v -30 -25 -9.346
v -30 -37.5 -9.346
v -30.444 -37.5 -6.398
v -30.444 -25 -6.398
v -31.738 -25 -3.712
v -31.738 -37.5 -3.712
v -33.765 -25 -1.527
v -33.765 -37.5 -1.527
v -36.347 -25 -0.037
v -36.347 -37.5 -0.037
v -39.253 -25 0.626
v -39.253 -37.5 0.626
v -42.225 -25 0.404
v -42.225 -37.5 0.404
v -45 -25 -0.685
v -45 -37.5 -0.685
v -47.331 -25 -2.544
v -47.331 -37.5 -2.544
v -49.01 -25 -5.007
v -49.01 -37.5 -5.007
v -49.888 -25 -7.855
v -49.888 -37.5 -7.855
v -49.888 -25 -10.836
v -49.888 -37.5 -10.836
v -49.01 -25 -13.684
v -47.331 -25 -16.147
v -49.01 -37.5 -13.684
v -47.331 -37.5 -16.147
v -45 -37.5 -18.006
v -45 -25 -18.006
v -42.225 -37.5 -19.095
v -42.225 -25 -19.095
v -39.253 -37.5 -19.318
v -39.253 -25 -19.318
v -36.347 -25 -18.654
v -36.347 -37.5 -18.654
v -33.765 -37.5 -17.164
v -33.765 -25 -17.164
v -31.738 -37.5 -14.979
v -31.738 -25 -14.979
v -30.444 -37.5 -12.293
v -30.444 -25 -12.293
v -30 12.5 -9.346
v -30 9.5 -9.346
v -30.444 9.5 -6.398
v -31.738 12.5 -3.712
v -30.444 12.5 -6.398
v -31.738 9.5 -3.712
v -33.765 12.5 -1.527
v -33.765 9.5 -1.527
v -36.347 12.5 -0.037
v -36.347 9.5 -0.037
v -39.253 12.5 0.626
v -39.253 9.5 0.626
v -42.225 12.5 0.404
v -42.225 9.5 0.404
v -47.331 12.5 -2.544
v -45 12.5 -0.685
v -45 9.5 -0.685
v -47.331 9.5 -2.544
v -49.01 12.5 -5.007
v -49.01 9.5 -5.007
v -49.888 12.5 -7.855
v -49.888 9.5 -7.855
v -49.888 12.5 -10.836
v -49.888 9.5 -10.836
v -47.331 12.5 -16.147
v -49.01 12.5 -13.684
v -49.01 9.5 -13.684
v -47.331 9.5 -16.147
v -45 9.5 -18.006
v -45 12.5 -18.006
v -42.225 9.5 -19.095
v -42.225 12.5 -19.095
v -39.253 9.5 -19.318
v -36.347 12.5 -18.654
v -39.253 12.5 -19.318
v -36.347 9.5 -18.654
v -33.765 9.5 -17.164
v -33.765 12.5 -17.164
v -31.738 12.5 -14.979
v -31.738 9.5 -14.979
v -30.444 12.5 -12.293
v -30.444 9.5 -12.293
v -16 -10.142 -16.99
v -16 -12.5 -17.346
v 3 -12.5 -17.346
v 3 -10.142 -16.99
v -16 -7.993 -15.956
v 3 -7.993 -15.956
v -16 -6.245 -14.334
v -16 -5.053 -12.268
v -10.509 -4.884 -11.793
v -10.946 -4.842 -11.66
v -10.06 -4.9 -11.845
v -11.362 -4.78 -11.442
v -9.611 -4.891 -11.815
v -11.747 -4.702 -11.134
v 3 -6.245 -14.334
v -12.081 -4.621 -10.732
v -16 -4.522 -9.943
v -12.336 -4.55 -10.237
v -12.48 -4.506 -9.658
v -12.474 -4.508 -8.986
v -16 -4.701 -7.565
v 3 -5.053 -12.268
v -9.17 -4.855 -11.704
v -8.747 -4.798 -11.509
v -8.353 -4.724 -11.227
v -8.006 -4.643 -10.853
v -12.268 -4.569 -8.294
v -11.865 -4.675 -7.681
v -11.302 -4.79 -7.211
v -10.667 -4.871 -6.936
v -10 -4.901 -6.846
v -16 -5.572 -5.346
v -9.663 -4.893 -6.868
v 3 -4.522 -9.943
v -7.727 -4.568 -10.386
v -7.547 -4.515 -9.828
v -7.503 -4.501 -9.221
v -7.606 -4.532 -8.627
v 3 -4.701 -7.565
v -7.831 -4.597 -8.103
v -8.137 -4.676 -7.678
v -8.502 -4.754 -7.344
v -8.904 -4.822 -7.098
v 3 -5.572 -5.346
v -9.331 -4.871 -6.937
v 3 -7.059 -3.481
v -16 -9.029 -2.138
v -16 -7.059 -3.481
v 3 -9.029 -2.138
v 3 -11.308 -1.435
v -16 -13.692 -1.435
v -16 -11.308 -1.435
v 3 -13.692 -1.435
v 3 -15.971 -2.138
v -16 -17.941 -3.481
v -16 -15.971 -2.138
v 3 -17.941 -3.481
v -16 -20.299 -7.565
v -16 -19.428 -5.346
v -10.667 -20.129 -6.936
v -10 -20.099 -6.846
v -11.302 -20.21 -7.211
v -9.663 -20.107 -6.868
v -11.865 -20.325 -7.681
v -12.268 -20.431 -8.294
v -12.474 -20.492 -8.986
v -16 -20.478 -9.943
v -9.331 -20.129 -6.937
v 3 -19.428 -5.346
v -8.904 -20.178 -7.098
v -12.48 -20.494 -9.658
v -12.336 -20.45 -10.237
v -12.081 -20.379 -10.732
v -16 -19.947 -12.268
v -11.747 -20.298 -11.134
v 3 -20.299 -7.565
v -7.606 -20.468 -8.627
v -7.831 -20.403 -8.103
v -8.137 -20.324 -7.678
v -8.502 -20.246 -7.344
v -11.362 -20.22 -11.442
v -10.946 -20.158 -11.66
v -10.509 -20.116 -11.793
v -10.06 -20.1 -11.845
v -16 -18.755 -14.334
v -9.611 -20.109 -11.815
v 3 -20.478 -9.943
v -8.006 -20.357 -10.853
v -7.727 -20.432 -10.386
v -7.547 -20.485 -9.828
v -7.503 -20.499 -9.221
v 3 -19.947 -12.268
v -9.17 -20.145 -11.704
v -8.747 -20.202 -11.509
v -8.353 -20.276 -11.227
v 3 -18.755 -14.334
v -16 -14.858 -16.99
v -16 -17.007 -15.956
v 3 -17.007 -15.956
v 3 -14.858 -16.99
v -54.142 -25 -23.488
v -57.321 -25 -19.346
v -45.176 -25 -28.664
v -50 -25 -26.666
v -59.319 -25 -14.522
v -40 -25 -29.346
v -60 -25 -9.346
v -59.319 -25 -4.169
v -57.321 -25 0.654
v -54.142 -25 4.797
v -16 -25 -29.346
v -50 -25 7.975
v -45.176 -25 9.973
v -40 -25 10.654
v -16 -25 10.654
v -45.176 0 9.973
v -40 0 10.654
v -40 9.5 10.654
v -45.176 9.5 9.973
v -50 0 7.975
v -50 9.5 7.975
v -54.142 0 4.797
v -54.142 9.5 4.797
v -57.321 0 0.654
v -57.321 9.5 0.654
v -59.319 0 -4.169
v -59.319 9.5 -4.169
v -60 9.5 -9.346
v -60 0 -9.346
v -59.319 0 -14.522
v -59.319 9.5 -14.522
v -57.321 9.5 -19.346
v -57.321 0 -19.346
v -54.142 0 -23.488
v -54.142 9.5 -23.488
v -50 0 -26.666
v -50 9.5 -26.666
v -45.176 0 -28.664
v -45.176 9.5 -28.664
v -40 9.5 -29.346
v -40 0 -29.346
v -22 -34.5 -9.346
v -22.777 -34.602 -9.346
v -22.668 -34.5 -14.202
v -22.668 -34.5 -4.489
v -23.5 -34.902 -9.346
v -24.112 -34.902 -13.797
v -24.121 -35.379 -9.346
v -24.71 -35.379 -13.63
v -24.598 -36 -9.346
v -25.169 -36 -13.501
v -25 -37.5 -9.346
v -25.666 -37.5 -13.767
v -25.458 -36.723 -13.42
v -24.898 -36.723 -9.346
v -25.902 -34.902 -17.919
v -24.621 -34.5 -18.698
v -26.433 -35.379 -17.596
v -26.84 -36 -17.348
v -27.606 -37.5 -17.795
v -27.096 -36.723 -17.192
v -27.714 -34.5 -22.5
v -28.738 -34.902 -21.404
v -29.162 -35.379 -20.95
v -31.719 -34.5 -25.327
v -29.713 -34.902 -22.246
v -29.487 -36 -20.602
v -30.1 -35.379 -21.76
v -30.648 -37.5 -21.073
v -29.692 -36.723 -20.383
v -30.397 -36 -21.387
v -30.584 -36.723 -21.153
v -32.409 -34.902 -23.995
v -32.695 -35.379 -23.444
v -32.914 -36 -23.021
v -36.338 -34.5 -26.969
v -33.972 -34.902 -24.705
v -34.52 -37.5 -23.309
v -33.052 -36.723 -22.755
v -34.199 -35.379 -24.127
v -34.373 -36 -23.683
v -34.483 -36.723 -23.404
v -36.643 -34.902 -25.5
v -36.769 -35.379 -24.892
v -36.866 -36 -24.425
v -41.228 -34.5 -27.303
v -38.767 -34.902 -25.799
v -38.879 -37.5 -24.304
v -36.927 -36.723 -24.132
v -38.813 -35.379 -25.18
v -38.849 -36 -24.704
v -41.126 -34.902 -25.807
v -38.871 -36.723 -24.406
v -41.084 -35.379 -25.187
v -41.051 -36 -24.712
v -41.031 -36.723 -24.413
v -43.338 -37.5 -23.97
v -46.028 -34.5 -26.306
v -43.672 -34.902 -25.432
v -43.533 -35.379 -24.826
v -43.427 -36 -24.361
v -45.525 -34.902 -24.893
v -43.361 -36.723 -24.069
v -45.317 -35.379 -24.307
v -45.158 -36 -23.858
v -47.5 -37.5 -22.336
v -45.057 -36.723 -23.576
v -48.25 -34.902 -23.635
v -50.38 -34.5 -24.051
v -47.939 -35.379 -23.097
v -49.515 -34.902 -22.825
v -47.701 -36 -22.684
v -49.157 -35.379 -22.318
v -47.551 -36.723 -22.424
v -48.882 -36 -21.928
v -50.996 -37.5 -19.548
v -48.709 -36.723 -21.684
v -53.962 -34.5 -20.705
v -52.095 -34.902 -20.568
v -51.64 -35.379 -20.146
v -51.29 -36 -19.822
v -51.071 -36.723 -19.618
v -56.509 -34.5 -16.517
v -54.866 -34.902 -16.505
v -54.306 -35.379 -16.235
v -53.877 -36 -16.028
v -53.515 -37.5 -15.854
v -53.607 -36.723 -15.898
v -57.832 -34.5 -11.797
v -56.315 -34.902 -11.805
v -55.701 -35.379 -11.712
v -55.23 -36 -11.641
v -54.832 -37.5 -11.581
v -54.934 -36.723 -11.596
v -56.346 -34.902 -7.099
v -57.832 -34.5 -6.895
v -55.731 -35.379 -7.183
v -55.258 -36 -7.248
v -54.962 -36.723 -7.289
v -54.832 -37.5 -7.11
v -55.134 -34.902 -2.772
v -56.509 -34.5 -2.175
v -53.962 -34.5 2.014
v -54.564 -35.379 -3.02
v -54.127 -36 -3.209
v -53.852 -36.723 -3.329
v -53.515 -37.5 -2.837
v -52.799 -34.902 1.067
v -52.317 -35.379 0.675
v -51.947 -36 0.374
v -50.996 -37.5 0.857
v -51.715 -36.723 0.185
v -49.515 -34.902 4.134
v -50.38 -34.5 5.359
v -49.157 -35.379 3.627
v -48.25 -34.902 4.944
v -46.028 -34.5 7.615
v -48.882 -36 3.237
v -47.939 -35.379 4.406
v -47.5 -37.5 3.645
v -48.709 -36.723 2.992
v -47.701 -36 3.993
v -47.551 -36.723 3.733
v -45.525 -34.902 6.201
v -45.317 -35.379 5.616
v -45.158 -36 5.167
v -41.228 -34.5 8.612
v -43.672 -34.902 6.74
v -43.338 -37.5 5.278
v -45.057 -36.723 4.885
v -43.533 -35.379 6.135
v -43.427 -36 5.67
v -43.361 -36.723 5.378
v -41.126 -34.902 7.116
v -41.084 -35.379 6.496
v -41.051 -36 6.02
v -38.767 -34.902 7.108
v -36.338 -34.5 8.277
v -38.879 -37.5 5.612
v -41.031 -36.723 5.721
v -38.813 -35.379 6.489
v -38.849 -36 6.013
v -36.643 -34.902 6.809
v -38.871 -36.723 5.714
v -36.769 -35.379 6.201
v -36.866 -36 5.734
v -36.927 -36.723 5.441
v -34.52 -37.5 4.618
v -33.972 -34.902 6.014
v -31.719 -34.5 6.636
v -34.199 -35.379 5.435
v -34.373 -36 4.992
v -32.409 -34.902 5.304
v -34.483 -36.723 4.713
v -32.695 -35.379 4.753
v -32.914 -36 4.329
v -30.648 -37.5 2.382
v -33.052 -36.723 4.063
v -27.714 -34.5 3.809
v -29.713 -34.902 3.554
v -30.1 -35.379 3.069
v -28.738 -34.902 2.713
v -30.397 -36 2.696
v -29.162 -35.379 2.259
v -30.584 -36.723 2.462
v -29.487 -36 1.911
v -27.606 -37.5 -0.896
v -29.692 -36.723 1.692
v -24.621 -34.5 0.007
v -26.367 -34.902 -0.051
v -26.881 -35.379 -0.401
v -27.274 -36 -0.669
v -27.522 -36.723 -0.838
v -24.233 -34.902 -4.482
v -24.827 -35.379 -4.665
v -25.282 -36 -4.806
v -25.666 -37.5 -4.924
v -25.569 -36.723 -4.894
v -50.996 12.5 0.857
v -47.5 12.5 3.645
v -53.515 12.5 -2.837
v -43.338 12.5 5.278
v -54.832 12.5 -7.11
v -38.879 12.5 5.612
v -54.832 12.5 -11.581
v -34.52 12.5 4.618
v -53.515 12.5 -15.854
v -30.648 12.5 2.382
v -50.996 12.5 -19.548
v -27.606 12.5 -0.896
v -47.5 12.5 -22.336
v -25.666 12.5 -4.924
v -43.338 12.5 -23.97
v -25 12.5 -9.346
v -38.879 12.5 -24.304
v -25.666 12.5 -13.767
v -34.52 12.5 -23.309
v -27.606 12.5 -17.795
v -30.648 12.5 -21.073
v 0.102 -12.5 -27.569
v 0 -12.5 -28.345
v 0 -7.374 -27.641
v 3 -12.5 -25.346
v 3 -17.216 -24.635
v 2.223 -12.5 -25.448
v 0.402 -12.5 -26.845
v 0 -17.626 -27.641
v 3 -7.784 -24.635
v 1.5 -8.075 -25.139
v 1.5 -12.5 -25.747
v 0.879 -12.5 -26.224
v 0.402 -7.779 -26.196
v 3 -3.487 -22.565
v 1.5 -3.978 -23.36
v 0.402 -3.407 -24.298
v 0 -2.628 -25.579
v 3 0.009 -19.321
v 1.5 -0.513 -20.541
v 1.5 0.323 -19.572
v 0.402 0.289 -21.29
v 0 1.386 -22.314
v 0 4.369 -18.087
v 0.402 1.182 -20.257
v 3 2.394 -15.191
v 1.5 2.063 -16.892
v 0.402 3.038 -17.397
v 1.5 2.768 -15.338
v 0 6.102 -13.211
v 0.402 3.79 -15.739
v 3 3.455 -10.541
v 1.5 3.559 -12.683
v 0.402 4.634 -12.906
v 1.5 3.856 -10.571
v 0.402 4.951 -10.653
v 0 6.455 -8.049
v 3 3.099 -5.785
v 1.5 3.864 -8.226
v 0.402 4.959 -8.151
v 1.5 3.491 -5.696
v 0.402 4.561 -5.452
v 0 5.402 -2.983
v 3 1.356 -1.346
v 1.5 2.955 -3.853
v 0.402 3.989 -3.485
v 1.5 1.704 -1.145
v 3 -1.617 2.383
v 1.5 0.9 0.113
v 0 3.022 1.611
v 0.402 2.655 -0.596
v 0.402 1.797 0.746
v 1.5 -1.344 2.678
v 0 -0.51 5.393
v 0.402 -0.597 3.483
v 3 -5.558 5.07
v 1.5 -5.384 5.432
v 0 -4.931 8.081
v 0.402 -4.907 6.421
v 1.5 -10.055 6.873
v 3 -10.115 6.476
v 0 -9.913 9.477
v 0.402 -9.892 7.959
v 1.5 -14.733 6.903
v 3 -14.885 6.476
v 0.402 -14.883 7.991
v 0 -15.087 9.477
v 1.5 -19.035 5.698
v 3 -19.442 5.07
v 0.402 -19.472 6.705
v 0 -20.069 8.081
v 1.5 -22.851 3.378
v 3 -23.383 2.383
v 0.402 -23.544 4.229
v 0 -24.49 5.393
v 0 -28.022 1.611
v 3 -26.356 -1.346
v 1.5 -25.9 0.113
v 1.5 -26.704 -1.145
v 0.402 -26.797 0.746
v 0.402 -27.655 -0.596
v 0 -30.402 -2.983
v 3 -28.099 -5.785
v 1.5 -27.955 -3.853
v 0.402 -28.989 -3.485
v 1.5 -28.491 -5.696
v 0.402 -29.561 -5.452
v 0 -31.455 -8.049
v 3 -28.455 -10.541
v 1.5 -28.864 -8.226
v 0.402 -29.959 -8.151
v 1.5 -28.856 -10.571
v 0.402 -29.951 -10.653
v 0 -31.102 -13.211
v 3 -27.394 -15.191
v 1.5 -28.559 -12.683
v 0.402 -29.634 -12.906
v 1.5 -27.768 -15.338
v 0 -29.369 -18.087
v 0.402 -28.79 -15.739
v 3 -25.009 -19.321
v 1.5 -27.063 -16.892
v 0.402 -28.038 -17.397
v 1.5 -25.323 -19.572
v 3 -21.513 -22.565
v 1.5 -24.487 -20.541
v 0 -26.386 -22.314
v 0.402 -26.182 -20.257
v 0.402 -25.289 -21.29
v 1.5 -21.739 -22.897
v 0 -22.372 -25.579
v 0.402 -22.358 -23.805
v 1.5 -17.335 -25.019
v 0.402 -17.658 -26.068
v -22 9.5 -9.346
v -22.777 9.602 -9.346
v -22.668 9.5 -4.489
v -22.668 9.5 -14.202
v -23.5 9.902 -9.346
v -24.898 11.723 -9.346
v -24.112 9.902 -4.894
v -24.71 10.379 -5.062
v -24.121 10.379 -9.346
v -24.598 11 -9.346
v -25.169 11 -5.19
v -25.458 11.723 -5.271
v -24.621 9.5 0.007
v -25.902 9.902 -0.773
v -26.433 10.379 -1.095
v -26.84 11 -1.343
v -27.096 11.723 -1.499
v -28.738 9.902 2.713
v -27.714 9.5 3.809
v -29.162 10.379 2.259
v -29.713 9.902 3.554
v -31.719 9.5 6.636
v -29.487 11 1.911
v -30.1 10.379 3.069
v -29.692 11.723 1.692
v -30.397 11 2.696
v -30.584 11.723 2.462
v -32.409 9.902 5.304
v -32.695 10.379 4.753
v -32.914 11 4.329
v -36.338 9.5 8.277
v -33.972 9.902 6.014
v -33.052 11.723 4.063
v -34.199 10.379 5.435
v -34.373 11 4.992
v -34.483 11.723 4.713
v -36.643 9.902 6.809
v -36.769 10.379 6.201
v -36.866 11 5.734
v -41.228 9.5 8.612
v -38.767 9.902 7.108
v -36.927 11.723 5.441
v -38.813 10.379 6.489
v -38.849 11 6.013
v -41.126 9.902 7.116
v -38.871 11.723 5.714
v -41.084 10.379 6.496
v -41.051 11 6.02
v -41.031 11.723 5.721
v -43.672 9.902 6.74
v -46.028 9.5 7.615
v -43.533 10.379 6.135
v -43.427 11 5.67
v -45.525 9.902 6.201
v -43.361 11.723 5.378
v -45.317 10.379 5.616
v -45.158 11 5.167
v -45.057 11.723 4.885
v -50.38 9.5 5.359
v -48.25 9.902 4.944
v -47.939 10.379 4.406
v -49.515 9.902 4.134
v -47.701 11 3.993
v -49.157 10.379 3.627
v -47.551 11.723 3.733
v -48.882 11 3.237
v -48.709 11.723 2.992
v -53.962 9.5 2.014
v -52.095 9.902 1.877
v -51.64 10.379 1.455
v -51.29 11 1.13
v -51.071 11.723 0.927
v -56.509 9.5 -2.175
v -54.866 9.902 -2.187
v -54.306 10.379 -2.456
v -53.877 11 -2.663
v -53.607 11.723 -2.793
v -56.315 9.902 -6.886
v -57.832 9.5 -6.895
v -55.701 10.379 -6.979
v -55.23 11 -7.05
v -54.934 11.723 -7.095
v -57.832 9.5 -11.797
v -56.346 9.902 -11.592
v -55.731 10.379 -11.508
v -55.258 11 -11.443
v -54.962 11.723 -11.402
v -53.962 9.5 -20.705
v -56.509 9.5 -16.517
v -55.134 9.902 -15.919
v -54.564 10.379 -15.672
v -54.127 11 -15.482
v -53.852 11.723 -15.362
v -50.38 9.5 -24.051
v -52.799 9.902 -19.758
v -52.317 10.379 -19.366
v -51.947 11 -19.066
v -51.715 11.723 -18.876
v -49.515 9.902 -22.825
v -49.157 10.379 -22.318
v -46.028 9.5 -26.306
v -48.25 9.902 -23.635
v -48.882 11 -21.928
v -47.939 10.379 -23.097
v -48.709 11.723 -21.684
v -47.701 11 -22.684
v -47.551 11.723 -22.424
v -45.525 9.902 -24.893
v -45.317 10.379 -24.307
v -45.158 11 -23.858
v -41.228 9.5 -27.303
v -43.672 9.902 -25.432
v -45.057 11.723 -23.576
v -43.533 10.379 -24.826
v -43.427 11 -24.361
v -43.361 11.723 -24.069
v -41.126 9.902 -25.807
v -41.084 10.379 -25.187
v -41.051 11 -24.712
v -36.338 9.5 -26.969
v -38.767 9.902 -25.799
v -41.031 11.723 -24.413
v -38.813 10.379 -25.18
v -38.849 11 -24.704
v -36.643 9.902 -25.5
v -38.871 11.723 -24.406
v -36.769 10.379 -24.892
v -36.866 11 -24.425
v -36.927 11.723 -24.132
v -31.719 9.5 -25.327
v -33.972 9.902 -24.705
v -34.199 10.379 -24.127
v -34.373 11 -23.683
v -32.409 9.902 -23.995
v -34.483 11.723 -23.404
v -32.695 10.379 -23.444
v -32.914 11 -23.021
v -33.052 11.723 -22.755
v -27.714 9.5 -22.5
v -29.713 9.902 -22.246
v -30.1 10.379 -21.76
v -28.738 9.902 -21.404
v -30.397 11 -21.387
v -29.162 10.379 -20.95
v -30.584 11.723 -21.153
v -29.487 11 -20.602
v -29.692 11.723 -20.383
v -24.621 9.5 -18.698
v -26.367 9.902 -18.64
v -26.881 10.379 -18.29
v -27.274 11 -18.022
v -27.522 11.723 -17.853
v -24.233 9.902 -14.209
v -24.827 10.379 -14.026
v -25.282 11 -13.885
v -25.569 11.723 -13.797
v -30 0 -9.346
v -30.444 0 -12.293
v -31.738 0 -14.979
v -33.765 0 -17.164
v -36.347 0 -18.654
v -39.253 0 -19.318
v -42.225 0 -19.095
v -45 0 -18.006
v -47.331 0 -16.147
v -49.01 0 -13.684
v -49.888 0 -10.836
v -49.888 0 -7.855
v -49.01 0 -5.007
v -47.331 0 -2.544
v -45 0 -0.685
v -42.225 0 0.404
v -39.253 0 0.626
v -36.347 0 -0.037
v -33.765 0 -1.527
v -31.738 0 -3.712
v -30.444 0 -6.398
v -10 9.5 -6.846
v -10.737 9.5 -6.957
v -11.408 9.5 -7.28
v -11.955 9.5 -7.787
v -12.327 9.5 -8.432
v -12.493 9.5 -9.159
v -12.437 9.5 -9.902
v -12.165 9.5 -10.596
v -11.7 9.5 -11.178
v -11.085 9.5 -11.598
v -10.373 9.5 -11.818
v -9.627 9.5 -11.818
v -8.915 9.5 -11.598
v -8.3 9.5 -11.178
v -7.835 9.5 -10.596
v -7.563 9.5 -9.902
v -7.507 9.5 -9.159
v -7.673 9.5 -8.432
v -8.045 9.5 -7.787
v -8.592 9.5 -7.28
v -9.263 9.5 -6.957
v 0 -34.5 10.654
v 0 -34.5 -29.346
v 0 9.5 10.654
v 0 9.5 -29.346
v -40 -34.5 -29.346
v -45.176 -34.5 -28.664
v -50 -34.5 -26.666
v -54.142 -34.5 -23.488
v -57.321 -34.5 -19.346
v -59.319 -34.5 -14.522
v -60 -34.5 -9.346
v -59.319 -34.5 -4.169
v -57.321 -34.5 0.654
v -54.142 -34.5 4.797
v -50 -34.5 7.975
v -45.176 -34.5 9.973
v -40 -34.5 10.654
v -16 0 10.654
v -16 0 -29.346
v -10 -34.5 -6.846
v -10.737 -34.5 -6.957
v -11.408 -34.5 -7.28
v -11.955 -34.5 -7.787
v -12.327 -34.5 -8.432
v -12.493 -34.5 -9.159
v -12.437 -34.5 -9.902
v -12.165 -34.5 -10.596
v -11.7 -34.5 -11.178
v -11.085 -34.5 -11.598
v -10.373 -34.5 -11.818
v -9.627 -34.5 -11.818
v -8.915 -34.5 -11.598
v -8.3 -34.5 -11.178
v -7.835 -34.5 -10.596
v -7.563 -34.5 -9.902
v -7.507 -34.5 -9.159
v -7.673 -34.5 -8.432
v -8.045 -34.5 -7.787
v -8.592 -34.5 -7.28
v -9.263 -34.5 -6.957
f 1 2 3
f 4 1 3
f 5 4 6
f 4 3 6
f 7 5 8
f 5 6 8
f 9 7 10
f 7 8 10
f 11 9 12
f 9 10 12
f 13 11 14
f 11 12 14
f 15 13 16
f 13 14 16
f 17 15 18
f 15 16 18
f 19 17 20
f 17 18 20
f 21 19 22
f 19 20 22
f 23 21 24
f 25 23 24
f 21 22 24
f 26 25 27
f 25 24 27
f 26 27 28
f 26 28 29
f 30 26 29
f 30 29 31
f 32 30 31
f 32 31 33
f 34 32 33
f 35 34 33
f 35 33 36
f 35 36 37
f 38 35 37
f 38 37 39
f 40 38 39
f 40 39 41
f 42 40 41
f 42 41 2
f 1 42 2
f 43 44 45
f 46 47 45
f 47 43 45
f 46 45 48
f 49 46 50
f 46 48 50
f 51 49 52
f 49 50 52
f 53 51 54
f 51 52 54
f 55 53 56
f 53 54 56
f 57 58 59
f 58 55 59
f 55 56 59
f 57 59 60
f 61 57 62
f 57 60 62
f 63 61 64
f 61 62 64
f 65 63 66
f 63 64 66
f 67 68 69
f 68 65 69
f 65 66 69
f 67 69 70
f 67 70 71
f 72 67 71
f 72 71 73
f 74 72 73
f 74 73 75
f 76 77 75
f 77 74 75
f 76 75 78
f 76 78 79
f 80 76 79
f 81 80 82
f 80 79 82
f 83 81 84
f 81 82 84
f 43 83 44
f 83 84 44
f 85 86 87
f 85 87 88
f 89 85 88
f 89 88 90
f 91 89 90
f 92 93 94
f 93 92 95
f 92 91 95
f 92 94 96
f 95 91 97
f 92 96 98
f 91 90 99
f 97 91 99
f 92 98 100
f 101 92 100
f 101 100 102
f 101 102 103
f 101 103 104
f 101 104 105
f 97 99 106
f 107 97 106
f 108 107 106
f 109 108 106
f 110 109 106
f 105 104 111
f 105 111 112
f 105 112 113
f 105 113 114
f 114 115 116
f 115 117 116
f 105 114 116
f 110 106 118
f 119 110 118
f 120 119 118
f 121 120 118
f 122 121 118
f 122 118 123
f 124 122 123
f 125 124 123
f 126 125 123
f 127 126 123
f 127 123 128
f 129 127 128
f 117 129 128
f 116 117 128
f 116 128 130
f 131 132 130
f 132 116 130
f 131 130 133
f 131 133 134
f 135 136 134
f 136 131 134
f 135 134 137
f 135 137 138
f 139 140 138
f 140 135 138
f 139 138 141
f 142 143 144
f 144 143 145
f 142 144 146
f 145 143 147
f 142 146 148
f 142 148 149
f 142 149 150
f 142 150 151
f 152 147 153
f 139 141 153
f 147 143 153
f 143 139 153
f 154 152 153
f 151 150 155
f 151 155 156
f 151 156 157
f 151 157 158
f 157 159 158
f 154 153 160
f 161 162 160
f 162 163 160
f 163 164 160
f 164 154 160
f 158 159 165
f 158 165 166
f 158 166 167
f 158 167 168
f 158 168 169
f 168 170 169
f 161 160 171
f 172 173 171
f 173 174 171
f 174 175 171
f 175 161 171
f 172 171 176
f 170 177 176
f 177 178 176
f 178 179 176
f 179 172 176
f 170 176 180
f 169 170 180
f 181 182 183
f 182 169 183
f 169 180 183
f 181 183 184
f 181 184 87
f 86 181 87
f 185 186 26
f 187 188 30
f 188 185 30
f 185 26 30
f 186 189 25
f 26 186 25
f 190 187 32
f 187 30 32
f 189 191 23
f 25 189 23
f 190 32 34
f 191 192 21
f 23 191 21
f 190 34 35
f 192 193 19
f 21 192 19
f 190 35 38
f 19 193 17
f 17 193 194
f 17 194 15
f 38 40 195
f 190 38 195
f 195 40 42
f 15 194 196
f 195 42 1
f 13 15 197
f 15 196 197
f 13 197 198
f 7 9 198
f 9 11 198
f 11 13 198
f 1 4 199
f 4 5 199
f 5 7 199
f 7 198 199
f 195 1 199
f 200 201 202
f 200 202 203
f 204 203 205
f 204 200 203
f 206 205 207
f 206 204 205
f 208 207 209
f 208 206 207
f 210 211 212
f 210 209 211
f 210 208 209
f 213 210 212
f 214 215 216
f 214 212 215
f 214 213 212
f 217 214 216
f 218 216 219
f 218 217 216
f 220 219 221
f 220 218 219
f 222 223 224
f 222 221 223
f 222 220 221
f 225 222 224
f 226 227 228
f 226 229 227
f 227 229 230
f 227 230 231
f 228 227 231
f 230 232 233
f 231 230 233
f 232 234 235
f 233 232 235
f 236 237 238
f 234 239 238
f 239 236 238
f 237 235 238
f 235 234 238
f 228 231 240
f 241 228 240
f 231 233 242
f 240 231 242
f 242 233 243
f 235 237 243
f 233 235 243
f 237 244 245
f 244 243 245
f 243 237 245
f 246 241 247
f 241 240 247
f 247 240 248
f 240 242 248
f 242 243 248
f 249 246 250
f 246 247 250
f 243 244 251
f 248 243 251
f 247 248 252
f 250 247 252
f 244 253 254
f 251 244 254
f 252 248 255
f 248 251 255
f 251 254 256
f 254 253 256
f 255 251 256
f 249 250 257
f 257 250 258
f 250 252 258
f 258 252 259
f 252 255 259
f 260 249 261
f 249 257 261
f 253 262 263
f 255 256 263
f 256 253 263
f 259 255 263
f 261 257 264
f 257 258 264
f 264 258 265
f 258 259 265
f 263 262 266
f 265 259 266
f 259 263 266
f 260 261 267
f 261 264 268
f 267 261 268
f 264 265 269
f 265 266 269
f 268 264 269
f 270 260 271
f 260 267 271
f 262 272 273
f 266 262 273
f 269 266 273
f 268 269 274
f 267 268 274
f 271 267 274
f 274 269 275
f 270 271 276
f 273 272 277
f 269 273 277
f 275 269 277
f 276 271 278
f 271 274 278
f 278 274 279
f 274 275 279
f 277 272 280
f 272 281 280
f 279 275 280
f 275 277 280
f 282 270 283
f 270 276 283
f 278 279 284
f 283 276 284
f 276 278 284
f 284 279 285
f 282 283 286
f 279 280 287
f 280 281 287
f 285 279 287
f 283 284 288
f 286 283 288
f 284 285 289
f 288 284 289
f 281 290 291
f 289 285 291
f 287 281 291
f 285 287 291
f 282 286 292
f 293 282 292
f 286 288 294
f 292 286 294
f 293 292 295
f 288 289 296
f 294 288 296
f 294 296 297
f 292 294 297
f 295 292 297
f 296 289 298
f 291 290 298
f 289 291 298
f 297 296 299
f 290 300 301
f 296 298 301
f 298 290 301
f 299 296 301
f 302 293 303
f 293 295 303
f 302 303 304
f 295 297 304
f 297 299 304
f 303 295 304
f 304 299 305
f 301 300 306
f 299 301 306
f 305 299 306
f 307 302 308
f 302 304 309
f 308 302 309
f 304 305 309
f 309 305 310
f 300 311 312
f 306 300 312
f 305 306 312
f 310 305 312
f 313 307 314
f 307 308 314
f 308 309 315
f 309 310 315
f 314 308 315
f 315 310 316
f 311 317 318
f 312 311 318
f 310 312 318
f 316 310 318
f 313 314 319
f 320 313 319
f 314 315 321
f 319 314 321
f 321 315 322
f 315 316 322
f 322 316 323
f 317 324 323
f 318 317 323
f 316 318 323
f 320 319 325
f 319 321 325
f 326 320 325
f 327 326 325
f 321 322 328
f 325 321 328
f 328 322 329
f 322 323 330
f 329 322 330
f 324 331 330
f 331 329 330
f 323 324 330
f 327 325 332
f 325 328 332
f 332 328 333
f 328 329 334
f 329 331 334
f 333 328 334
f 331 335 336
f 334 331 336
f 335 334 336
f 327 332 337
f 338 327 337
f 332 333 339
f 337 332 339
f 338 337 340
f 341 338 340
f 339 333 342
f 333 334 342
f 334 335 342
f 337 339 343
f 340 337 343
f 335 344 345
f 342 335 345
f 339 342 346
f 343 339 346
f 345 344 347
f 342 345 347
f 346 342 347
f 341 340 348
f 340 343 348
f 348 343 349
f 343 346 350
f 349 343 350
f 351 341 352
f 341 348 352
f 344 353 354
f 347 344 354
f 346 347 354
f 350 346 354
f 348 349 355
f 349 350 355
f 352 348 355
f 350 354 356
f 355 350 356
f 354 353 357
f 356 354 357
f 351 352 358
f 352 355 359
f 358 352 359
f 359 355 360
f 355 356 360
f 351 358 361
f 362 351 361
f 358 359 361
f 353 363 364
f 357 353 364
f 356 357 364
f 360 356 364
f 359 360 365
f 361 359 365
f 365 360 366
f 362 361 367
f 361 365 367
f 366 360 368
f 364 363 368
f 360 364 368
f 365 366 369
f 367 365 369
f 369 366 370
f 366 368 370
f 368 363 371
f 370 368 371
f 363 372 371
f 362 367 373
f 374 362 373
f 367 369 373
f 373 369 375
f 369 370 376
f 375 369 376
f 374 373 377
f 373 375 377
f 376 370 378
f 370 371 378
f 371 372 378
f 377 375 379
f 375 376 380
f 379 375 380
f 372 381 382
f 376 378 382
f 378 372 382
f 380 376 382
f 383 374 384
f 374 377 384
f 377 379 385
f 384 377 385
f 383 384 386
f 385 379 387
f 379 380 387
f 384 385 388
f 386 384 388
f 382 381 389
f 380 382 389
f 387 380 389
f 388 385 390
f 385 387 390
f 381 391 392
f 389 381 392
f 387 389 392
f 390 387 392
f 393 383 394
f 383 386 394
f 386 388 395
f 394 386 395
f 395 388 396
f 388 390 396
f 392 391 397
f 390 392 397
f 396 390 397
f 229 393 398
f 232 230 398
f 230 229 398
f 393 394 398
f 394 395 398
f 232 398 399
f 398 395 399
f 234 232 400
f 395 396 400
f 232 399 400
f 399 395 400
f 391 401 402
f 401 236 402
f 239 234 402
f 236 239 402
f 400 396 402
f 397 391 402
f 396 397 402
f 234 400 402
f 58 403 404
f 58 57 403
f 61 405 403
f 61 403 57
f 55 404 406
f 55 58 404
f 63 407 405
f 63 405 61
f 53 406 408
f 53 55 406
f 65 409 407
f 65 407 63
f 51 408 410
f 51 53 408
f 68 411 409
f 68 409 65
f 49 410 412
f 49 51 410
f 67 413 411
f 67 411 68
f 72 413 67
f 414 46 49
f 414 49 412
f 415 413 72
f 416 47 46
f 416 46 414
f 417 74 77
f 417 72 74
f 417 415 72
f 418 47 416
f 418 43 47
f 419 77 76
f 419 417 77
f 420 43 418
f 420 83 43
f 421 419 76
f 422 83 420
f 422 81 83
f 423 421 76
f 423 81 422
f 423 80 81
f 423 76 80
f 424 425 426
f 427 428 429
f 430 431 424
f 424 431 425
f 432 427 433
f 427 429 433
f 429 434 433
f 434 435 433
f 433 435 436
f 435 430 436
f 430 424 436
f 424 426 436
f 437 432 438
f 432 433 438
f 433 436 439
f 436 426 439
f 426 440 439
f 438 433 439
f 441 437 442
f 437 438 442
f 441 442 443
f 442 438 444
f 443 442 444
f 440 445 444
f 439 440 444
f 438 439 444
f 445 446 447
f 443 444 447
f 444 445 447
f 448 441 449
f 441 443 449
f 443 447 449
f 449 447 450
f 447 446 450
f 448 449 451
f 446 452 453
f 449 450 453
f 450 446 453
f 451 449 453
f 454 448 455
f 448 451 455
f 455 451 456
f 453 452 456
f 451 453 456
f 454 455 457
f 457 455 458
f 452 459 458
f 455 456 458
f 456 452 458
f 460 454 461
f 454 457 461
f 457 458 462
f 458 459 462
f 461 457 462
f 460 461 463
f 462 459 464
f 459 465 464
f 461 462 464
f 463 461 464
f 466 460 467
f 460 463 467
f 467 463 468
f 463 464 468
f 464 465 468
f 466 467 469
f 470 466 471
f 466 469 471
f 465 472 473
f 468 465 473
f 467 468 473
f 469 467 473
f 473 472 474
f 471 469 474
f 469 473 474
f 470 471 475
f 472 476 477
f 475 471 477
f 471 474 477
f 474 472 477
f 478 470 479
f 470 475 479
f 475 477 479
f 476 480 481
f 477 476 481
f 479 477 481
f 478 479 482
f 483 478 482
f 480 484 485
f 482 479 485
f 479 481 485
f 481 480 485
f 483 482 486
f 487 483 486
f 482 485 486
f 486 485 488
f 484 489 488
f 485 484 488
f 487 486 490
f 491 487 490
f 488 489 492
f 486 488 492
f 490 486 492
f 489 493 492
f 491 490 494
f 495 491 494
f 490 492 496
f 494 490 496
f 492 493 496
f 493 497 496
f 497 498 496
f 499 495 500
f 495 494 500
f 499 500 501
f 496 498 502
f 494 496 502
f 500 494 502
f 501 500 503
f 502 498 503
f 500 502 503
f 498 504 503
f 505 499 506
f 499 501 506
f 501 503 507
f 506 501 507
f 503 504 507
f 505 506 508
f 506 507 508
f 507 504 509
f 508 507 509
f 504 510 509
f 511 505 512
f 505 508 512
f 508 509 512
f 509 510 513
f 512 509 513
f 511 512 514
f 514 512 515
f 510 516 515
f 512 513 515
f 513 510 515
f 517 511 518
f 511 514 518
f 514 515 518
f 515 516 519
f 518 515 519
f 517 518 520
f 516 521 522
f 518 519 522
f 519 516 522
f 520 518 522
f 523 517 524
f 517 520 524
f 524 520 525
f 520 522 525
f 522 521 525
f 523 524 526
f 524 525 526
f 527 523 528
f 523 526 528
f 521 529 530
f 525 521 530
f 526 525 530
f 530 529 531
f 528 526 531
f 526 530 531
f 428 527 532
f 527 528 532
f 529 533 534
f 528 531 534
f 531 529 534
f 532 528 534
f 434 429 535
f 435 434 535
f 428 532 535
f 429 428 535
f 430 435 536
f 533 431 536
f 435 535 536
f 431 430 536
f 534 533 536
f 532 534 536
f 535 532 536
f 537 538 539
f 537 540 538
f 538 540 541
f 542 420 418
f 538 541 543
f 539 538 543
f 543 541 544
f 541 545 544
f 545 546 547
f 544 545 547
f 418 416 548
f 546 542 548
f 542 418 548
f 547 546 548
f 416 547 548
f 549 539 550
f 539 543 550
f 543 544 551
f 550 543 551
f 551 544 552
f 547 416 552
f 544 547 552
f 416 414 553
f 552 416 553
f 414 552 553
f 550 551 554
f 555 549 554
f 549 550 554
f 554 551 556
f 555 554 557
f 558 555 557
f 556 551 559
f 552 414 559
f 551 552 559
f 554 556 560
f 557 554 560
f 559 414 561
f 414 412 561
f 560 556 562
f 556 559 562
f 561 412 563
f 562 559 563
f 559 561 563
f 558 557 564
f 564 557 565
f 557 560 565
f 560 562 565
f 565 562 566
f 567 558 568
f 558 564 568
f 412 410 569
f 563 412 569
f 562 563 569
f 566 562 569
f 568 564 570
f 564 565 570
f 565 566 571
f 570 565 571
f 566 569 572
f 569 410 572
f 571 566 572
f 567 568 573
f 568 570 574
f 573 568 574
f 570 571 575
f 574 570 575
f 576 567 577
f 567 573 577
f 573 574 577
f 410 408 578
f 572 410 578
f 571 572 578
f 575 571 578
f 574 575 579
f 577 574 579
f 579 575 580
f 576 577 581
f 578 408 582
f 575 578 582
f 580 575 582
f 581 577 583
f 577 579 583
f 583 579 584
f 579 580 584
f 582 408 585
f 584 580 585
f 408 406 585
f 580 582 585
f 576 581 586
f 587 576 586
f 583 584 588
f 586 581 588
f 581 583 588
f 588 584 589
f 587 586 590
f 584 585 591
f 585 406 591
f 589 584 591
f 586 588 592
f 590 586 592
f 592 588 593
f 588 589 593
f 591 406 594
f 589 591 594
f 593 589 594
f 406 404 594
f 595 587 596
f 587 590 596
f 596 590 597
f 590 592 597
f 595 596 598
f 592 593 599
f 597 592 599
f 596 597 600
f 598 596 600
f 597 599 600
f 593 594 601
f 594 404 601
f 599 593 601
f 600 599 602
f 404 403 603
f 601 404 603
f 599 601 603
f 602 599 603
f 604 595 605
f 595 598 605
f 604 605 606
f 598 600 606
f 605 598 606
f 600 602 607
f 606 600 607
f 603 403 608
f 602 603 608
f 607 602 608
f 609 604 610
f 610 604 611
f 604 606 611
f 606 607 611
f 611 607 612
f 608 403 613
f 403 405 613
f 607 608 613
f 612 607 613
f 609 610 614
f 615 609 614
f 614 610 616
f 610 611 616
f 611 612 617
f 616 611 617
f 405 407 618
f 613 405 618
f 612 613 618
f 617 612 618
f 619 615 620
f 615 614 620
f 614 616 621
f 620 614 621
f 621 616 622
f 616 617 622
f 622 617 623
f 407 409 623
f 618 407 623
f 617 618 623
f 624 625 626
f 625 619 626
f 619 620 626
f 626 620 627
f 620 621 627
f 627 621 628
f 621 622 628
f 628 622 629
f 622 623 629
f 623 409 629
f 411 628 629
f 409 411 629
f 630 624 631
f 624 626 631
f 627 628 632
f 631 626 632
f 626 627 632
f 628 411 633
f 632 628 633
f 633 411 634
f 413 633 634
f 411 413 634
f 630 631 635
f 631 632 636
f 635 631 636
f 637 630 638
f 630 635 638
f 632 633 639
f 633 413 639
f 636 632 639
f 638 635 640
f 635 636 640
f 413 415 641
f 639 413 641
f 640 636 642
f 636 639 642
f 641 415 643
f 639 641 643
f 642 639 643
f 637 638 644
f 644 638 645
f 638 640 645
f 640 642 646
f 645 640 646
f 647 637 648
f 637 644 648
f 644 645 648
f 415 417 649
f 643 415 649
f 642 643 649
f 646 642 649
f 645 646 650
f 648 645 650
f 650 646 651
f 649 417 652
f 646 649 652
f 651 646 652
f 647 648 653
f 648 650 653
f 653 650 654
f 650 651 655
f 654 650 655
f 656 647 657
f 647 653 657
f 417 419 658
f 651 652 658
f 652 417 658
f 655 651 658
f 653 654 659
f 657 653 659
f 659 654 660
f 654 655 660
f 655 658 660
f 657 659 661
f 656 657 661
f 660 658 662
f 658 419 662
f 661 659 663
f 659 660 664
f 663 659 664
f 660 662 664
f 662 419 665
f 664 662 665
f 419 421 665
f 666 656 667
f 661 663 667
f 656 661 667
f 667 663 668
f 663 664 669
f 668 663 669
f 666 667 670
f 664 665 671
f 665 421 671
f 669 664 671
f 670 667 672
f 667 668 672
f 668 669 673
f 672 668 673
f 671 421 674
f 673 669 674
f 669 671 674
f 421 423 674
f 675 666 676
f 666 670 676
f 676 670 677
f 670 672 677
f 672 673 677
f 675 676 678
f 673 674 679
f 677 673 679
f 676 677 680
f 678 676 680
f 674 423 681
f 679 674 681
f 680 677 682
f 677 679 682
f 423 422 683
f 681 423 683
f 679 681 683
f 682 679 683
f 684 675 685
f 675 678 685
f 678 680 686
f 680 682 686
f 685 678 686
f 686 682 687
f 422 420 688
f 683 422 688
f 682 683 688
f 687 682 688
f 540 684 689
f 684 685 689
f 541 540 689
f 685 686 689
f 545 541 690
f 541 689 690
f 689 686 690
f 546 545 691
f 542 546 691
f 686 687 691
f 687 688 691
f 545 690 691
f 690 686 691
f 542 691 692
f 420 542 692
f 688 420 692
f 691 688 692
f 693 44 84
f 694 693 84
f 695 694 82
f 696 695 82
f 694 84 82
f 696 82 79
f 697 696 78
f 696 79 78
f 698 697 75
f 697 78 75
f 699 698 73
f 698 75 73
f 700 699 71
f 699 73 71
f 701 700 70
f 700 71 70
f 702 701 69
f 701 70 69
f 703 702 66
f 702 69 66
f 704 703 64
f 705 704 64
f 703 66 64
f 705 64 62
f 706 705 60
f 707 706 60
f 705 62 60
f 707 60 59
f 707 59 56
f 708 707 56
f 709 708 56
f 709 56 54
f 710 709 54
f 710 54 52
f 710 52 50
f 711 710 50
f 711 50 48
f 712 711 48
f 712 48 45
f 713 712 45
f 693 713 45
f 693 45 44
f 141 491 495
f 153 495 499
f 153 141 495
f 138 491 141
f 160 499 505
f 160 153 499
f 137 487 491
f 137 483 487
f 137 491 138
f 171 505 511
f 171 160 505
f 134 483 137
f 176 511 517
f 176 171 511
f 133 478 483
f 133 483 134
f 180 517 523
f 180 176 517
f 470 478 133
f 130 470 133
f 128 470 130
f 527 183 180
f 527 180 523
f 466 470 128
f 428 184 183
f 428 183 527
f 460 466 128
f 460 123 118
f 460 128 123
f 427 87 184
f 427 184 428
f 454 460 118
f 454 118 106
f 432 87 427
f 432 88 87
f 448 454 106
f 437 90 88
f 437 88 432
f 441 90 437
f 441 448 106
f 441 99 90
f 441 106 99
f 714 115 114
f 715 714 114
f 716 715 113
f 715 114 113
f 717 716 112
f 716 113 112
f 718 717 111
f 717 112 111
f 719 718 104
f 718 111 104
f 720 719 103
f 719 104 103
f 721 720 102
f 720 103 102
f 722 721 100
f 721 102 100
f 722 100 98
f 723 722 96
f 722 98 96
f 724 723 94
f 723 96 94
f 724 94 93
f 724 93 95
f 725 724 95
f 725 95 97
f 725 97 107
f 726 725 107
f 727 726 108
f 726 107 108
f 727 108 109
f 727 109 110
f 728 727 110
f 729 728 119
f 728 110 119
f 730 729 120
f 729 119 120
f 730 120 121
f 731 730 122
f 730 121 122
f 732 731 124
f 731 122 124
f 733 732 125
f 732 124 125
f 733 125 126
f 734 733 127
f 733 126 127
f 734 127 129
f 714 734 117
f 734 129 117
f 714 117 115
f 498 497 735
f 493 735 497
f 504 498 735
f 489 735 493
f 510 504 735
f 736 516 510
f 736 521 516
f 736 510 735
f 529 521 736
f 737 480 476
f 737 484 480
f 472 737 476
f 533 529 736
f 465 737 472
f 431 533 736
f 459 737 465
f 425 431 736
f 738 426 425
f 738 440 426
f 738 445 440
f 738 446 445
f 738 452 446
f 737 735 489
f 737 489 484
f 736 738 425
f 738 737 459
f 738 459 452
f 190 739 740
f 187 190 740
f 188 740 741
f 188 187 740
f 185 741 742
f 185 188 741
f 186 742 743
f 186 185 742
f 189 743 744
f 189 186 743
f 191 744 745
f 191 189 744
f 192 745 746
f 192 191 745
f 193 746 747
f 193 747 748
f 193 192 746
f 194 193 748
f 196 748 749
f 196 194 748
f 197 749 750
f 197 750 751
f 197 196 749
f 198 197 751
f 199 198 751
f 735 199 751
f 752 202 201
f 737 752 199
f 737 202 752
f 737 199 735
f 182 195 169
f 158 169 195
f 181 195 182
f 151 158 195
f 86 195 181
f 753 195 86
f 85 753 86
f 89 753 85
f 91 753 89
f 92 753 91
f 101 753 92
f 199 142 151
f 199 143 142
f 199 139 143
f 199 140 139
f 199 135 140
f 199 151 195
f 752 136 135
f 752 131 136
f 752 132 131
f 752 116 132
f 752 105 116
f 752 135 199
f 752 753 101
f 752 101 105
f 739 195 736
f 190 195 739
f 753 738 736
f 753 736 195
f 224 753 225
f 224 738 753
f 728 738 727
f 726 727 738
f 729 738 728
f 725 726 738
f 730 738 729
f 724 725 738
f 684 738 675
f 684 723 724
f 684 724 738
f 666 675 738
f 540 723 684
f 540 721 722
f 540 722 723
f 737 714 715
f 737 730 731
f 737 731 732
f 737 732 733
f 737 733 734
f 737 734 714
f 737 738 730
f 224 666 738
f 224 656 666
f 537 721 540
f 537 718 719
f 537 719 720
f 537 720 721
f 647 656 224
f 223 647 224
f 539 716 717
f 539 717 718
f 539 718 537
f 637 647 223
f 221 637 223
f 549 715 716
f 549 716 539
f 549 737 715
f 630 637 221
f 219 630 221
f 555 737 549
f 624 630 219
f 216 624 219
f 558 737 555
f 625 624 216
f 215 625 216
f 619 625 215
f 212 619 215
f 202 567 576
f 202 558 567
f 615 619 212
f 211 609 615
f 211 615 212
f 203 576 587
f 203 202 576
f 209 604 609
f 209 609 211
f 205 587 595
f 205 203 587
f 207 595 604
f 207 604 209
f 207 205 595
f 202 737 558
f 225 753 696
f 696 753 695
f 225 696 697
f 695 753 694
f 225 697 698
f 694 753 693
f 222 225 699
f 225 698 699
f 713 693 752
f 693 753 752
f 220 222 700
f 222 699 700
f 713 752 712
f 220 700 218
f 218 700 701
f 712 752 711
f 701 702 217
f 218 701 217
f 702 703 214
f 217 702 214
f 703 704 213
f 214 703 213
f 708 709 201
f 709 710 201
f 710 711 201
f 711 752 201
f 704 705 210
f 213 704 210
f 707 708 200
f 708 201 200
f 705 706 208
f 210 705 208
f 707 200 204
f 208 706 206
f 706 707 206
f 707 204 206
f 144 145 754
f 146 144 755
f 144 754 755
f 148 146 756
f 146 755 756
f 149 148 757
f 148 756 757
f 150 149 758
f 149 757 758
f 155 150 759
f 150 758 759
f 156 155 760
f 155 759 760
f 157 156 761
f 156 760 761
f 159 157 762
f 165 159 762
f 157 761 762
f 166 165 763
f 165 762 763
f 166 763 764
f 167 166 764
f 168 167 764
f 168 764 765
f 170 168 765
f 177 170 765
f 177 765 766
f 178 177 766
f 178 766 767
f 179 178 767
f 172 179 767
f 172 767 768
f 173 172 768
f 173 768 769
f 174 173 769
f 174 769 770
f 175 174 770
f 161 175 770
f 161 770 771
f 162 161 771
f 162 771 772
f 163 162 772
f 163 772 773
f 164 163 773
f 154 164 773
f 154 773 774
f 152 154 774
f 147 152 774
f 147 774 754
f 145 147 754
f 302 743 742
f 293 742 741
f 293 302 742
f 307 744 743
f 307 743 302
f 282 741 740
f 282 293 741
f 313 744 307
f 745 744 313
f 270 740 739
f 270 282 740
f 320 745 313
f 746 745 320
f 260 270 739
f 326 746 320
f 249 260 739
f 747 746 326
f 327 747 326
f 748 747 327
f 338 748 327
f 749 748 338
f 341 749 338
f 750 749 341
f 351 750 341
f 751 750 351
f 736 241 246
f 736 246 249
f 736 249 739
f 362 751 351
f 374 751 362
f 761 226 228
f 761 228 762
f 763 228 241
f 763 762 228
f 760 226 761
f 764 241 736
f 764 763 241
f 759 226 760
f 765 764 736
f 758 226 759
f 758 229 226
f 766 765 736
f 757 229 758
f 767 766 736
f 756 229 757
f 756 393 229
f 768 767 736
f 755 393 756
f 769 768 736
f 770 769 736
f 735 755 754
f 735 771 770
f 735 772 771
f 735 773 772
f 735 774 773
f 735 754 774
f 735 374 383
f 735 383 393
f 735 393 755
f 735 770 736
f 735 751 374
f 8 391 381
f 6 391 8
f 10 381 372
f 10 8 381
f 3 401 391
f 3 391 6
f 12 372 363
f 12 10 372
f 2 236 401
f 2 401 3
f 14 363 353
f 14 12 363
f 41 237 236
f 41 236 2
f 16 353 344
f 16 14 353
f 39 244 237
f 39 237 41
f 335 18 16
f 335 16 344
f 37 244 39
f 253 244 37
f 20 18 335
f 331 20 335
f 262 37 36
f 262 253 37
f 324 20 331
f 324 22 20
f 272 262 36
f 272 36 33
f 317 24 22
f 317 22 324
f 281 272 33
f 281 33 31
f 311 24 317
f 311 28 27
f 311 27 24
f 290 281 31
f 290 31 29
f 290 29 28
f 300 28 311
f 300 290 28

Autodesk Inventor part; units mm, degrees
ref_plane "YZ Plane" through (0, 0, 0) normal (1, 0, 0) x (0, 1, 0)
ref_plane "XZ Plane" through (0, 0, 0) normal (0, 1, 0) x (-1, 0, 0)
ref_plane "XY Plane" through (0, 0, 0) normal (0, 0, 1) x (1, 0, 0)
sketch "Szkic1" plane through (0, 0, 0) normal (0, 1, 0) x (-1, 0, 0)
  line L0 (0, 10.6544) -> (0, -29.3456)
  line L1 (0, -29.3456) -> (40, -29.3456)
  line L2 (0, 10.6544) -> (40, 10.6544)
  arc A0 (40, -29.3456) -> (40, 10.6544) centre (40, -9.3456) ccw
  point P0 (0, 0)
  dimension "d0" = 40
  dimension "d1" = 40
extrude "Wyciągnięcie proste1" add sketch "Szkic1" along normal blind 9.5
sketch "Szkic2" plane through (0, 9.5, 0) normal (0, 1, 0) x (1, 0, 0)
  line L0 (-40, -10.6544) -> (0, -10.6544) projected
  line L1 (0.0007, -10.6544) -> (-40, -10.6544)
  arc A0 (-40, 29.3456) -> (-40, -10.6544) centre (-40, 9.3456) ccw projected
  circle A1 centre (-40, 9.3456) radius 15
  circle A2 centre (-40, 9.3456) radius 10
  point P0 (0, 0)
  dimension "d4" = 30
  dimension "d5" = 20
extrude "Wyciągnięcie proste2" add sketch "Szkic2" along normal blind 3
fillet "Zaokrąglenie1" radius 3 1 edges at (-55, 9.5, -9.3456)
sketch "Szkic3" plane through (0, 0, 0) normal (0, -1, 0) x (1, 0, 0)
  line L0 (0, 10.6544) -> (0, -29.3456) projected
  line L1 (0, -29.3456) -> (-16, -29.3456)
  line L2 (0, -29.3456) -> (-40, -29.3456) projected
  line L3 (-16, -29.3456) -> (-16, 10.6544)
  line L4 (-40, 10.6544) -> (0, 10.6544) projected
  line L5 (-16, 10.6544) -> (0, 10.6544)
  line L6 (0, 10.6544) -> (0, -29.3456)
  point P0 (0, 0)
  dimension "d9" = 16
  dimension "d10" = 40
extrude "Wyciągnięcie proste3" add sketch "Szkic3" along normal blind 12.5
sketch "Szkic4" plane through (-40, 9.5, -9.3456) normal (0, 1, 0) x (1, 0, 0)
  point P0 (40, -9.3456)
mirror "Odbij1" about plane through (-8, -12.5, -9.3456) normal (0, -1, 0)
sketch "Szkic7" plane through (0, 9.5, 10.6544) normal (1, 0, 0) x (0, 0, -1)
  point P0 (10.6544, -9.5)
sketch "Szkic8" plane through (0, 9.5, 10.6544) normal (1, 0, 0) x (0, 0, -1)
  point P0 (10.6544, -9.5)
sketch "Szkic9" plane through (0, 9.5, 10.6544) normal (1, 0, 0) x (0, 0, -1)
  line L0 (40, 0) -> (0, 0) projected
  line L1 (0, 0) -> (0, -22)
  line L2 (0, -44) -> (0, 0) projected
  line L3 (0, -22) -> (20, -22)
  circle A0 centre (20, -22) radius 16
  circle A1 centre (20, -22) radius 8
  point P0 (10.6544, -9.5)
  dimension "d15" = 22
  dimension "d16" = 32
  dimension "d17" = 16
extrude "Wyciągnięcie proste4" cut sketch "Szkic9" against normal blind 20 contours A1
sketch "Szkic10" plane through (0, 9.5, 10.6544) normal (1, 0, 0) x (0, 0, -1)
  line L0 (0, -9.5) -> (0, 0) projected
  line L1 (0, 0) -> (0, -22)
  line L2 (0, -22) -> (20, -22)
  circle A0 centre (20, -22) radius 16
  point P0 (10.6544, -9.5)
  dimension "d20" = 22
  dimension "d21" = 20
  dimension "d22" = 32
extrude "Wyciągnięcie proste5" add sketch "Szkic10" along normal blind 3
fillet "Zaokrąglenie2" radius 3 1 edges at (0, -12.5, 6.6544)
sketch "Szkic11" plane through (3, -12.5, -9.3456) normal (1, 0, 0) x (0, 0, -1)
  circle A0 centre (0, 0) radius 8
  point P0 (-9.3456, 12.5)
  dimension "d26" = 16
extrude "Wyciągnięcie proste6" cut sketch "Szkic11" against normal blind 20
sketch "Szkic12" plane through (0, 0, 0) normal (0, -1, 0) x (1, 0, 0)
  point P0 (0, 0)
sketch "Szkic13" plane through (-40, -34.5, -9.3456) normal (0, -1, 0) x (1, 0, 0)
  point P0 (40, 9.3456)
sketch "Szkic14" plane through (-40, 12.5, -9.3456) normal (0, 1, 0) x (1, 0, 0)
  point P0 (40, -9.3456)
sketch "Szkic15" plane through (-40, 9.5, -9.3456) normal (0, 1, 0) x (1, 0, 0)
  circle A0 centre (0, 0) radius 10
  point P0 (40, -9.3456)
  dimension "d29" = 20
extrude "Wyciągnięcie proste7" cut sketch "Szkic15" against normal blind 9.5
sketch "Szkic16" plane through (-40, -34.5, -9.3456) normal (0, -1, 0) x (1, 0, 0)
  circle A0 centre (0, 0) radius 10
  point P0 (40, 9.3456)
  dimension "d32" = 20
extrude "Wyciągnięcie proste8" cut sketch "Szkic16" against normal blind 9.5
sketch "Szkic17" plane through (0, 9.5, 0) normal (0, 1, 0) x (1, 0, 0)
  line L0 (0, -10.6544) -> (0, 29.3456) projected
  line L1 (0, 9.3456) -> (-10, 9.3456)
  point P0 (0, 0)
hole "Otwór1" at (-10, 9.5, -9.3456) direction (0, -1, 0) diameter 5 depth 75.75 tip angle 118
properties part number "nakrętka" material "Stal nierdzewna, austenityczna"
